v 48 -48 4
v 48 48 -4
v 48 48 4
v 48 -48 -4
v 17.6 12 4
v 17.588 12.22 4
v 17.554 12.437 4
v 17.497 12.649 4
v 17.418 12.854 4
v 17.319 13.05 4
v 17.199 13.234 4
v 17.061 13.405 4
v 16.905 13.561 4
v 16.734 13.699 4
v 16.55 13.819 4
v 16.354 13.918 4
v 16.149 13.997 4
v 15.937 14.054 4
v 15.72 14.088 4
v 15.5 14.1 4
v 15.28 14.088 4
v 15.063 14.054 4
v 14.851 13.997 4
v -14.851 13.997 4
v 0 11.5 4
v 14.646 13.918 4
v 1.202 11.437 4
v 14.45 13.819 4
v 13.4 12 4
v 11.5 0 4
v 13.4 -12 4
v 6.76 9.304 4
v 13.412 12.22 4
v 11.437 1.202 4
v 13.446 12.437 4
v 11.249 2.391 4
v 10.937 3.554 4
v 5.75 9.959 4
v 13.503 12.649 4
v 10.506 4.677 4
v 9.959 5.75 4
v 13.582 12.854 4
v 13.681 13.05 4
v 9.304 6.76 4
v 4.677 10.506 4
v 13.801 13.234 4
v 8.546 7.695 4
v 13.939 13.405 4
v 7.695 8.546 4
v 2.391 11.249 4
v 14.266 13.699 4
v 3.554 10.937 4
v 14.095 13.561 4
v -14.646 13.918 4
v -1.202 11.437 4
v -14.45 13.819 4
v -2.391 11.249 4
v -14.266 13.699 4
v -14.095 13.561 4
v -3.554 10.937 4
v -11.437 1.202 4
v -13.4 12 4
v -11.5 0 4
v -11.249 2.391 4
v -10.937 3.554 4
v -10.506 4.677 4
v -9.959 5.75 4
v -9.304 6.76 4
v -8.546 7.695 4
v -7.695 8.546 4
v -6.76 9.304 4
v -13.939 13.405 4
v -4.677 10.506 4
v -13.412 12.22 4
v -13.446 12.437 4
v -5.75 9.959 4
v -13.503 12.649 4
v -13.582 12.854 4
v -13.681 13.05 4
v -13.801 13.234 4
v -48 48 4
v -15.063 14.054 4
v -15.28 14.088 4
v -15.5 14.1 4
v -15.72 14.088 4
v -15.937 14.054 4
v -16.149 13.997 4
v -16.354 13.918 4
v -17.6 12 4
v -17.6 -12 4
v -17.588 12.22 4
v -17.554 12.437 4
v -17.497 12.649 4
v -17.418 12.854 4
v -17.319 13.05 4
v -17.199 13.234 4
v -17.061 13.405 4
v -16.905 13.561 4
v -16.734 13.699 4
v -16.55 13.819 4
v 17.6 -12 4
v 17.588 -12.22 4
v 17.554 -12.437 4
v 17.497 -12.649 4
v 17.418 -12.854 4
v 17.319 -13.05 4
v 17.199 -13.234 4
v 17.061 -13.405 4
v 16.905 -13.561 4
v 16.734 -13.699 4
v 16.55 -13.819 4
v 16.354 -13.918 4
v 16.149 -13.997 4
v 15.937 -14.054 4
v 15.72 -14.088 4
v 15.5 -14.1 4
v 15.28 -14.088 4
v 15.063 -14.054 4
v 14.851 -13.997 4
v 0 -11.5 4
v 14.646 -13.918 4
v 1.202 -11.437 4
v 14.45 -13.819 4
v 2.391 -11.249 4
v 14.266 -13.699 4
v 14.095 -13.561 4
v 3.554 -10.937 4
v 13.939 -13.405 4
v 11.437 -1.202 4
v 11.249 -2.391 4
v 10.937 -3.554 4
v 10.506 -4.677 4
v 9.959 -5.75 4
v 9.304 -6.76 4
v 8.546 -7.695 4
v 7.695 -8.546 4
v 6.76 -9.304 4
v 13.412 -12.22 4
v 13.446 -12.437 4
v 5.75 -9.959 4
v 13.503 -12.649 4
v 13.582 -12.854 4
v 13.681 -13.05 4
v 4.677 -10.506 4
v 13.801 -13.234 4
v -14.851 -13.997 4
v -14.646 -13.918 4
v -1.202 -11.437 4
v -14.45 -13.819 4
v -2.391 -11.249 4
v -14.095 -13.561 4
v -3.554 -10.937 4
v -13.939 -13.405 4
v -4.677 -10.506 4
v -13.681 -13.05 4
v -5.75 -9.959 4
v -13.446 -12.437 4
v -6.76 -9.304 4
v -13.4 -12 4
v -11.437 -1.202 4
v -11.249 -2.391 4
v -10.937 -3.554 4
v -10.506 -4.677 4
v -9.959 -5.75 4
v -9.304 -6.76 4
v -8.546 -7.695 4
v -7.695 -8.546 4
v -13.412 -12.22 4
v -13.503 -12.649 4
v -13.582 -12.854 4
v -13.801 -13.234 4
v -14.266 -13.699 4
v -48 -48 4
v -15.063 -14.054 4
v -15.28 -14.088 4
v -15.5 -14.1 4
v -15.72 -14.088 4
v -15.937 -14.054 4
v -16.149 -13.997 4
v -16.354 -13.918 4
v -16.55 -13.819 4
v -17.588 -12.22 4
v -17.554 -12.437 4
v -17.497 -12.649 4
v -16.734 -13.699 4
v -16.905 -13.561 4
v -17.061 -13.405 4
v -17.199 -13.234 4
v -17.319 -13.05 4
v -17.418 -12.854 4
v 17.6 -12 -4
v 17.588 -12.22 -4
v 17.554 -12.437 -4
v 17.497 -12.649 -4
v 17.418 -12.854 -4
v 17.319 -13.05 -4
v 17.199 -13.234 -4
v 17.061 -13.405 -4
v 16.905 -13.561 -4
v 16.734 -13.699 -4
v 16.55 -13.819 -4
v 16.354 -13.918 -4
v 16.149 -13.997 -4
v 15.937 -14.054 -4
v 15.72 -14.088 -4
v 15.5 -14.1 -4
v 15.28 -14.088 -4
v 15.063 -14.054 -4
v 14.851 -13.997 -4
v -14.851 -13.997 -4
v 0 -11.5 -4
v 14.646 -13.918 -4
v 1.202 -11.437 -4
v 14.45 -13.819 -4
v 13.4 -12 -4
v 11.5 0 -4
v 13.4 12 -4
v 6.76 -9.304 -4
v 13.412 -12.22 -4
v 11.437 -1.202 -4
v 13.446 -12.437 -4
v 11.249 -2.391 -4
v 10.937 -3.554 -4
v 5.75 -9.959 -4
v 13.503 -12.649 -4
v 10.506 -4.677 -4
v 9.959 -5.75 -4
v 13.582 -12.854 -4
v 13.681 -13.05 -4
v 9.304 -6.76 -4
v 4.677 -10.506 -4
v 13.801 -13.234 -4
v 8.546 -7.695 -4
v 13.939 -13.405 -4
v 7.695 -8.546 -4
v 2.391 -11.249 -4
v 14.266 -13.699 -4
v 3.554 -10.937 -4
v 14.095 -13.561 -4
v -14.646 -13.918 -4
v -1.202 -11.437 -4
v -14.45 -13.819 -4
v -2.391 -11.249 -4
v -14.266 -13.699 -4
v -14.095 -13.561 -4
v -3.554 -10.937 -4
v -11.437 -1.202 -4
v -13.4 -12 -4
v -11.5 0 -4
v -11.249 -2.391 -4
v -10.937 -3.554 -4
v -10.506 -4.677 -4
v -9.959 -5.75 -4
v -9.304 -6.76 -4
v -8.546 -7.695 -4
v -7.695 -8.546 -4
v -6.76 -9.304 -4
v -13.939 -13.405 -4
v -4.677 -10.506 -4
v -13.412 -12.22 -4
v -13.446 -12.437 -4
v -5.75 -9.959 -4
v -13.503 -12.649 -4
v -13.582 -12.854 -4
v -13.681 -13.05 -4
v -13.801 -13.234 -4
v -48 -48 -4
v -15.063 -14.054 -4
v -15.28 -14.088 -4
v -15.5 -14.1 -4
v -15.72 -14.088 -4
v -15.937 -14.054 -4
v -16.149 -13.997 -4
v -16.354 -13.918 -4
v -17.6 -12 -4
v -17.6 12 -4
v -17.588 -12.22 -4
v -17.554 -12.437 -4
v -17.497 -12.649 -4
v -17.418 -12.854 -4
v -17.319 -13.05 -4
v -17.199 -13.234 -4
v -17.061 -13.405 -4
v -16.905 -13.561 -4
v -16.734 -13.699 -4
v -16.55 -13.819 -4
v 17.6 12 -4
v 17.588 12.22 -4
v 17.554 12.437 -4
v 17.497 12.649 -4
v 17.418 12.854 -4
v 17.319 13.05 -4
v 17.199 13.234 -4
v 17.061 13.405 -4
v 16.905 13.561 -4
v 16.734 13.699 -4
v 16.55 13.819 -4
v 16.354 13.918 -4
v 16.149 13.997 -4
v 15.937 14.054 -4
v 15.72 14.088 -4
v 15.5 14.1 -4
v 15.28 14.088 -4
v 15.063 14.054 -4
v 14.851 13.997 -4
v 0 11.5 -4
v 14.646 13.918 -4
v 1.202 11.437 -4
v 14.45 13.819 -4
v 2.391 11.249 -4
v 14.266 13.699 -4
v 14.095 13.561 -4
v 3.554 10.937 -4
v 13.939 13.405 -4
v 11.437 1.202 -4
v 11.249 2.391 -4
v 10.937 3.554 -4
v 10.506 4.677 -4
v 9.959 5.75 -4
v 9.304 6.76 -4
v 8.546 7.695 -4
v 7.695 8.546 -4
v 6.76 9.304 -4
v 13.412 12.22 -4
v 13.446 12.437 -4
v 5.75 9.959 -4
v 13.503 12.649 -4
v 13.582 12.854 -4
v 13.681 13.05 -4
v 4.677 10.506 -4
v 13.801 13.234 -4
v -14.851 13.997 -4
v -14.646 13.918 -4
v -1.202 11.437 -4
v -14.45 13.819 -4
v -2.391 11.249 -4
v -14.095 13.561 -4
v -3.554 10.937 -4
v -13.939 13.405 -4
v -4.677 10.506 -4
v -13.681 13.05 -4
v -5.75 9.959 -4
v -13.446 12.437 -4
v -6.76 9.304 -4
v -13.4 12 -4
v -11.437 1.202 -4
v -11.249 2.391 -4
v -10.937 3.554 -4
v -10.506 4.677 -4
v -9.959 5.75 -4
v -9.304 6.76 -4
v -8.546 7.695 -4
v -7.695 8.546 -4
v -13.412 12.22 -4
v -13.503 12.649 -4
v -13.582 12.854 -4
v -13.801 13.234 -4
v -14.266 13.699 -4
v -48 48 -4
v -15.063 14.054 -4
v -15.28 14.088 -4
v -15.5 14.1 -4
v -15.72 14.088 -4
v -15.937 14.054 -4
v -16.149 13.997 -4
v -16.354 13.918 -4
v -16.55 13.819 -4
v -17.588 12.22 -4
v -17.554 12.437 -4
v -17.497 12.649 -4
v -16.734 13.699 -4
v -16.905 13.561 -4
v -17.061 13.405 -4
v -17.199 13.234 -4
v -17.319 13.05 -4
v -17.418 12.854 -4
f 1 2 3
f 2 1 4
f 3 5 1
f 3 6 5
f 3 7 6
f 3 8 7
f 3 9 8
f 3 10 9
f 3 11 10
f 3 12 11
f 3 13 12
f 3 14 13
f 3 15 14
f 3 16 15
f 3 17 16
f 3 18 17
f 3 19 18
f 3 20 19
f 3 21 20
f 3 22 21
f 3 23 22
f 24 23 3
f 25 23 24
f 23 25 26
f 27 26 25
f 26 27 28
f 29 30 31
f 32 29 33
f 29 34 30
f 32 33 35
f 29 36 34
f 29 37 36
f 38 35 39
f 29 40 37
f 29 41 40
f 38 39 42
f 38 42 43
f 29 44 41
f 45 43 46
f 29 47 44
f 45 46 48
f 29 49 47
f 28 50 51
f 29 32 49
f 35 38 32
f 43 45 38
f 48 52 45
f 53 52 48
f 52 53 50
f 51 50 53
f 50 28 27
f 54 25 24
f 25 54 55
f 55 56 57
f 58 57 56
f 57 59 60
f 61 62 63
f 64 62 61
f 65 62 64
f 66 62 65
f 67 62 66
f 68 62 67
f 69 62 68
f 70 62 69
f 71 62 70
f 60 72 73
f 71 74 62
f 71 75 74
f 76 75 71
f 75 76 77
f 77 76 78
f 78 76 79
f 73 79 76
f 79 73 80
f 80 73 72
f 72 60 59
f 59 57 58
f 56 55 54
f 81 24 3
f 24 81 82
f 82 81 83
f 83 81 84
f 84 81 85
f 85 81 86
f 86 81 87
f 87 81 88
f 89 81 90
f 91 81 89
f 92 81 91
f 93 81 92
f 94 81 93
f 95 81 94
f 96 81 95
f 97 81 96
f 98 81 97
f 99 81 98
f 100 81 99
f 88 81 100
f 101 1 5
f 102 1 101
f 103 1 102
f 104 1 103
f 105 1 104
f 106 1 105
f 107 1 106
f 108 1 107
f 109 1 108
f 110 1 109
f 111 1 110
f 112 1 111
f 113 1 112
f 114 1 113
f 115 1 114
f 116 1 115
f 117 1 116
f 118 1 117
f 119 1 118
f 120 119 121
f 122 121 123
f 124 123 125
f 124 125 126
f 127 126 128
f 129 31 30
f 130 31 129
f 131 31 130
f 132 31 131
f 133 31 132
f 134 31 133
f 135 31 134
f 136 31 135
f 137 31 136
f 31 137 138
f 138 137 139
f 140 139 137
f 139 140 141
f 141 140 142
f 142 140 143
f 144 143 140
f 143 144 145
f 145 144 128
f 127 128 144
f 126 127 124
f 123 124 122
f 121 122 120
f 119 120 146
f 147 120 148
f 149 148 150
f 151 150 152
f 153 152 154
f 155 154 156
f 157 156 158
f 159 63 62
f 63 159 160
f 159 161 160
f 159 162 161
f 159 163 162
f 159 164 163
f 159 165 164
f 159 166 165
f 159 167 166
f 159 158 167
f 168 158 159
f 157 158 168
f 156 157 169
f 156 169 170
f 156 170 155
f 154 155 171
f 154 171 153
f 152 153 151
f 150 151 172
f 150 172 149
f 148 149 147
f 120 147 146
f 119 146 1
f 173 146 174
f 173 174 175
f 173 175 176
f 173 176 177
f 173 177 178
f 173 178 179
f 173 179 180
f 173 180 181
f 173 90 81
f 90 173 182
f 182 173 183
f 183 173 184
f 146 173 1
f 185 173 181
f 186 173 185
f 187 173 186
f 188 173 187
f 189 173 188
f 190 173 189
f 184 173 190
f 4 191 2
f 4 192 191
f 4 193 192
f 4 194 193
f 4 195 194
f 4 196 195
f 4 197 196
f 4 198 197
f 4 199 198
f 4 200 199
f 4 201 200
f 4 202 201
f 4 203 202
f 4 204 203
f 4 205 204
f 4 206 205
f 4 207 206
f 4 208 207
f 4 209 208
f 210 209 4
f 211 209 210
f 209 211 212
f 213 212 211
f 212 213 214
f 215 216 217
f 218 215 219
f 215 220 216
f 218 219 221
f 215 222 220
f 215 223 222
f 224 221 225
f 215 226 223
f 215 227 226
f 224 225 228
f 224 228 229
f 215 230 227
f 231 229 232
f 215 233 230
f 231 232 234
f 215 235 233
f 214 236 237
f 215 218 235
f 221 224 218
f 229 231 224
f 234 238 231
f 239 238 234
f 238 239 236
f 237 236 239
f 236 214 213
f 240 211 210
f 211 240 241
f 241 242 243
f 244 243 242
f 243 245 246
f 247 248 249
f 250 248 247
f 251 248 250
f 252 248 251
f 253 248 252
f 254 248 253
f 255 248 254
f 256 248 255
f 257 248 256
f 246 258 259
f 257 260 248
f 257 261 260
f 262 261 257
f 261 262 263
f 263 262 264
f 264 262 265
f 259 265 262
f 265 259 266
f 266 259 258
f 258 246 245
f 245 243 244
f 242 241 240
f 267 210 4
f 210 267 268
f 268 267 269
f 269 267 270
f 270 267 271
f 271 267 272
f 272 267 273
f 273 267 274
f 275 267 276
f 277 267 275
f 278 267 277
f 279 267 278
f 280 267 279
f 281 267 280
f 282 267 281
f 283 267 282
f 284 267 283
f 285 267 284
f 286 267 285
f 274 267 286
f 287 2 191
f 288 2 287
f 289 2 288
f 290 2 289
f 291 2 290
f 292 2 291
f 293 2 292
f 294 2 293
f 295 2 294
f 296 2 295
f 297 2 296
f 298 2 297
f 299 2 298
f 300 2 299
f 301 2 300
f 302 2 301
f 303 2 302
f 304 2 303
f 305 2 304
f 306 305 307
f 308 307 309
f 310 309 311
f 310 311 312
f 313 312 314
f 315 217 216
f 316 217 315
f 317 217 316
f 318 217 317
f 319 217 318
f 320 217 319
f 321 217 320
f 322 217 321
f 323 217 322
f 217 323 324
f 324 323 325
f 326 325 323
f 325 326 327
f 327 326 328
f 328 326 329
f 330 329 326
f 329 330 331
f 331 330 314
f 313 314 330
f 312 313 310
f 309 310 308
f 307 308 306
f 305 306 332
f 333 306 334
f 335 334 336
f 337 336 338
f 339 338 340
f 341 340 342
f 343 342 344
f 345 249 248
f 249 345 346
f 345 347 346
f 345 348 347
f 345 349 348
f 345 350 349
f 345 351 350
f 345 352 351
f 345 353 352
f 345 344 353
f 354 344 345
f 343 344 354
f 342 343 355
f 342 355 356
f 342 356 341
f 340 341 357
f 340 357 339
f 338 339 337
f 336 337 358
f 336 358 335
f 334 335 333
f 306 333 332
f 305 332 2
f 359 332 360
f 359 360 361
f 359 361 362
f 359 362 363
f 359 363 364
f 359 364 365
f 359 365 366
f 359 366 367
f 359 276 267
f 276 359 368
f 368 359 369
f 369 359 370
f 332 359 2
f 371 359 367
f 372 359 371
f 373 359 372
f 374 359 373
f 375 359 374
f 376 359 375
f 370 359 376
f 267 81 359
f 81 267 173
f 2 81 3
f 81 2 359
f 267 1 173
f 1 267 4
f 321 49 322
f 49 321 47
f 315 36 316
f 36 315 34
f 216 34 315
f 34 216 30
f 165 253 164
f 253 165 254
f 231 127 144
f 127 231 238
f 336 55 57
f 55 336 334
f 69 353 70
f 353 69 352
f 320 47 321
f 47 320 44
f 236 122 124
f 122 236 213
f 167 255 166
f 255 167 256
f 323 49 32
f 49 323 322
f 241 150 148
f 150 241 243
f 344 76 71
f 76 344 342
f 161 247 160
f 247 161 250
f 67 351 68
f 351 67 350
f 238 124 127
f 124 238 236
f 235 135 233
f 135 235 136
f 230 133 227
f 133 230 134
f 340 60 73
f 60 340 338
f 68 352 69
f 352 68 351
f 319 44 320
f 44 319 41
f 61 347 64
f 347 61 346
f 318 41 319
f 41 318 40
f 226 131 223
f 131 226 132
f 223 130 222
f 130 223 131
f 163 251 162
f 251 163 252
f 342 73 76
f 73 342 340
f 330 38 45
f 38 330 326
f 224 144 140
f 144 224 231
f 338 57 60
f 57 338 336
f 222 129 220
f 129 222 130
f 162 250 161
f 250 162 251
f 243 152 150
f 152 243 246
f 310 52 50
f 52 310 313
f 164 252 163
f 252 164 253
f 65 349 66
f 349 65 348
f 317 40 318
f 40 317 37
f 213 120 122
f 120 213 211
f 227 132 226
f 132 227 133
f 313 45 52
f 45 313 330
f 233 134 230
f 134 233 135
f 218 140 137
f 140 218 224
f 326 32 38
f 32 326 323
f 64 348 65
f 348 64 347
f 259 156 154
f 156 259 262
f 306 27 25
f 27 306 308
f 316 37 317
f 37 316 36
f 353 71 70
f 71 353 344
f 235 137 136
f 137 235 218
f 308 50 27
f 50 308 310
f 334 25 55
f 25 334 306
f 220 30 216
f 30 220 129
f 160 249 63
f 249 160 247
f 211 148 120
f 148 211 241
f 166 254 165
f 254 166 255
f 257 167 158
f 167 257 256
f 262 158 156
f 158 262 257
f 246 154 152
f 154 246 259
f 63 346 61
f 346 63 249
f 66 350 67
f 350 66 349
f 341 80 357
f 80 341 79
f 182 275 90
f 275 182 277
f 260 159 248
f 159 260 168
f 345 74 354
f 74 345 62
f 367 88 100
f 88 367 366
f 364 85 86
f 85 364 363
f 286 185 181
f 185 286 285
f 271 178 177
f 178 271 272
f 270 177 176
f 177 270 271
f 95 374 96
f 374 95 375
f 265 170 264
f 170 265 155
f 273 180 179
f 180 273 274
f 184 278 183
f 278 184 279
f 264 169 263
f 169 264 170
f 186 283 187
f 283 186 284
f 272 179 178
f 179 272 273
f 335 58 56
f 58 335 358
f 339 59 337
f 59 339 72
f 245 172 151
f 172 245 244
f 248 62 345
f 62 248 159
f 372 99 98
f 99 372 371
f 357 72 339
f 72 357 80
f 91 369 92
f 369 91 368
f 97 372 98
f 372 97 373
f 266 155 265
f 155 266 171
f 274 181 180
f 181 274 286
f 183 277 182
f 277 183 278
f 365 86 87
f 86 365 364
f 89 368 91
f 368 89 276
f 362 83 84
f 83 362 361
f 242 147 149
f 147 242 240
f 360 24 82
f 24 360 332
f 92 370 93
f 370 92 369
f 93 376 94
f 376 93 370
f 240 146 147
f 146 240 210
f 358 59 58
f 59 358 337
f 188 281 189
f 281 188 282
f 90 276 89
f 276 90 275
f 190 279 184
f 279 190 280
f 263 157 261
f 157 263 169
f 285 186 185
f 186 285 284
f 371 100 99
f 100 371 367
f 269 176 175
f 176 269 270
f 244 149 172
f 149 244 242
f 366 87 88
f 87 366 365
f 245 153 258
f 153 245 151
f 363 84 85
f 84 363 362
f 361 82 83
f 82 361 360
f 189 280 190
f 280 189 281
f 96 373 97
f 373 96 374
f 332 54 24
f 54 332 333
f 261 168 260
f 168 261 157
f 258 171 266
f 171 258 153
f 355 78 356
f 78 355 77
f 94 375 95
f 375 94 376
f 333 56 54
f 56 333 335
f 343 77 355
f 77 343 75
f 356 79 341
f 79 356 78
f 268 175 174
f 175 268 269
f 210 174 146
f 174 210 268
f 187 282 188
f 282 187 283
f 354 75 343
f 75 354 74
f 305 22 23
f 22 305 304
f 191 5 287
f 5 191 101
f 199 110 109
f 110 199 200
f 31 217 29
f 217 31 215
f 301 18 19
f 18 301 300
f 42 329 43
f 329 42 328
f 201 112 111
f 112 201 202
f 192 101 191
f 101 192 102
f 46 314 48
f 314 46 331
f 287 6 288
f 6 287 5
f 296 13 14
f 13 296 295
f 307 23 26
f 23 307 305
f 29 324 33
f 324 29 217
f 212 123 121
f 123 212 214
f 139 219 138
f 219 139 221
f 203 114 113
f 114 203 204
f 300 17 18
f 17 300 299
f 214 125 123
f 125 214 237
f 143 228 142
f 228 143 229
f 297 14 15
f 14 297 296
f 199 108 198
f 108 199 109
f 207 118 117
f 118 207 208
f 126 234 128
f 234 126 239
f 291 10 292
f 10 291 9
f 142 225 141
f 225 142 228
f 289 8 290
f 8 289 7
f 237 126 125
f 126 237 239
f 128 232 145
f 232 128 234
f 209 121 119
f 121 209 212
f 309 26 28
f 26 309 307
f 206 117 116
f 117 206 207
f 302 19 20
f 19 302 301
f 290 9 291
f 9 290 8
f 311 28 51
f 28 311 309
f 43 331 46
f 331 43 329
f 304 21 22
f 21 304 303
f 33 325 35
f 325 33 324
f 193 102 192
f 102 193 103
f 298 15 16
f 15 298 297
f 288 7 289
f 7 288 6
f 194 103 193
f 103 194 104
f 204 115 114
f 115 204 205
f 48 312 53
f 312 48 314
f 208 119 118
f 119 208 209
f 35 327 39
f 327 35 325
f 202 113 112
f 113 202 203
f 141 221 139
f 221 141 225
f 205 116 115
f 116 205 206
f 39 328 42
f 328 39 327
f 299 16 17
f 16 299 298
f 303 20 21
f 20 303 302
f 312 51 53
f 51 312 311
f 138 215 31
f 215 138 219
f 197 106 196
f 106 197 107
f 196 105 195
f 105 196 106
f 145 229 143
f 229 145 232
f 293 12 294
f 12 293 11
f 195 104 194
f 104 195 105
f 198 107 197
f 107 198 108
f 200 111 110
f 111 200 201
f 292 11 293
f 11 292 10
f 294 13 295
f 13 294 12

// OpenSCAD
// NEMA 17 adjustable motor plate, 96 mm square.
$fn = 60;
eps = 0.02;
plate = 96;
plate_t = 8;
hole_pitch = 31;
center_d = 23;
slot_l = 24;
slot_d = 4.2;
module slot(x) {
    hull() {
        translate([x, -slot_l / 2, -plate_t / 2 - eps]) cylinder(d = slot_d, h = plate_t + 2 * eps);
        translate([x, slot_l / 2, -plate_t / 2 - eps]) cylinder(d = slot_d, h = plate_t + 2 * eps);
    }
}
difference() {
    cube([plate, plate, plate_t], center = true);
    translate([0, 0, -plate_t / 2 - eps]) cylinder(d = center_d, h = plate_t + 2 * eps);
    slot(-hole_pitch / 2);
    slot(hole_pitch / 2);
}
